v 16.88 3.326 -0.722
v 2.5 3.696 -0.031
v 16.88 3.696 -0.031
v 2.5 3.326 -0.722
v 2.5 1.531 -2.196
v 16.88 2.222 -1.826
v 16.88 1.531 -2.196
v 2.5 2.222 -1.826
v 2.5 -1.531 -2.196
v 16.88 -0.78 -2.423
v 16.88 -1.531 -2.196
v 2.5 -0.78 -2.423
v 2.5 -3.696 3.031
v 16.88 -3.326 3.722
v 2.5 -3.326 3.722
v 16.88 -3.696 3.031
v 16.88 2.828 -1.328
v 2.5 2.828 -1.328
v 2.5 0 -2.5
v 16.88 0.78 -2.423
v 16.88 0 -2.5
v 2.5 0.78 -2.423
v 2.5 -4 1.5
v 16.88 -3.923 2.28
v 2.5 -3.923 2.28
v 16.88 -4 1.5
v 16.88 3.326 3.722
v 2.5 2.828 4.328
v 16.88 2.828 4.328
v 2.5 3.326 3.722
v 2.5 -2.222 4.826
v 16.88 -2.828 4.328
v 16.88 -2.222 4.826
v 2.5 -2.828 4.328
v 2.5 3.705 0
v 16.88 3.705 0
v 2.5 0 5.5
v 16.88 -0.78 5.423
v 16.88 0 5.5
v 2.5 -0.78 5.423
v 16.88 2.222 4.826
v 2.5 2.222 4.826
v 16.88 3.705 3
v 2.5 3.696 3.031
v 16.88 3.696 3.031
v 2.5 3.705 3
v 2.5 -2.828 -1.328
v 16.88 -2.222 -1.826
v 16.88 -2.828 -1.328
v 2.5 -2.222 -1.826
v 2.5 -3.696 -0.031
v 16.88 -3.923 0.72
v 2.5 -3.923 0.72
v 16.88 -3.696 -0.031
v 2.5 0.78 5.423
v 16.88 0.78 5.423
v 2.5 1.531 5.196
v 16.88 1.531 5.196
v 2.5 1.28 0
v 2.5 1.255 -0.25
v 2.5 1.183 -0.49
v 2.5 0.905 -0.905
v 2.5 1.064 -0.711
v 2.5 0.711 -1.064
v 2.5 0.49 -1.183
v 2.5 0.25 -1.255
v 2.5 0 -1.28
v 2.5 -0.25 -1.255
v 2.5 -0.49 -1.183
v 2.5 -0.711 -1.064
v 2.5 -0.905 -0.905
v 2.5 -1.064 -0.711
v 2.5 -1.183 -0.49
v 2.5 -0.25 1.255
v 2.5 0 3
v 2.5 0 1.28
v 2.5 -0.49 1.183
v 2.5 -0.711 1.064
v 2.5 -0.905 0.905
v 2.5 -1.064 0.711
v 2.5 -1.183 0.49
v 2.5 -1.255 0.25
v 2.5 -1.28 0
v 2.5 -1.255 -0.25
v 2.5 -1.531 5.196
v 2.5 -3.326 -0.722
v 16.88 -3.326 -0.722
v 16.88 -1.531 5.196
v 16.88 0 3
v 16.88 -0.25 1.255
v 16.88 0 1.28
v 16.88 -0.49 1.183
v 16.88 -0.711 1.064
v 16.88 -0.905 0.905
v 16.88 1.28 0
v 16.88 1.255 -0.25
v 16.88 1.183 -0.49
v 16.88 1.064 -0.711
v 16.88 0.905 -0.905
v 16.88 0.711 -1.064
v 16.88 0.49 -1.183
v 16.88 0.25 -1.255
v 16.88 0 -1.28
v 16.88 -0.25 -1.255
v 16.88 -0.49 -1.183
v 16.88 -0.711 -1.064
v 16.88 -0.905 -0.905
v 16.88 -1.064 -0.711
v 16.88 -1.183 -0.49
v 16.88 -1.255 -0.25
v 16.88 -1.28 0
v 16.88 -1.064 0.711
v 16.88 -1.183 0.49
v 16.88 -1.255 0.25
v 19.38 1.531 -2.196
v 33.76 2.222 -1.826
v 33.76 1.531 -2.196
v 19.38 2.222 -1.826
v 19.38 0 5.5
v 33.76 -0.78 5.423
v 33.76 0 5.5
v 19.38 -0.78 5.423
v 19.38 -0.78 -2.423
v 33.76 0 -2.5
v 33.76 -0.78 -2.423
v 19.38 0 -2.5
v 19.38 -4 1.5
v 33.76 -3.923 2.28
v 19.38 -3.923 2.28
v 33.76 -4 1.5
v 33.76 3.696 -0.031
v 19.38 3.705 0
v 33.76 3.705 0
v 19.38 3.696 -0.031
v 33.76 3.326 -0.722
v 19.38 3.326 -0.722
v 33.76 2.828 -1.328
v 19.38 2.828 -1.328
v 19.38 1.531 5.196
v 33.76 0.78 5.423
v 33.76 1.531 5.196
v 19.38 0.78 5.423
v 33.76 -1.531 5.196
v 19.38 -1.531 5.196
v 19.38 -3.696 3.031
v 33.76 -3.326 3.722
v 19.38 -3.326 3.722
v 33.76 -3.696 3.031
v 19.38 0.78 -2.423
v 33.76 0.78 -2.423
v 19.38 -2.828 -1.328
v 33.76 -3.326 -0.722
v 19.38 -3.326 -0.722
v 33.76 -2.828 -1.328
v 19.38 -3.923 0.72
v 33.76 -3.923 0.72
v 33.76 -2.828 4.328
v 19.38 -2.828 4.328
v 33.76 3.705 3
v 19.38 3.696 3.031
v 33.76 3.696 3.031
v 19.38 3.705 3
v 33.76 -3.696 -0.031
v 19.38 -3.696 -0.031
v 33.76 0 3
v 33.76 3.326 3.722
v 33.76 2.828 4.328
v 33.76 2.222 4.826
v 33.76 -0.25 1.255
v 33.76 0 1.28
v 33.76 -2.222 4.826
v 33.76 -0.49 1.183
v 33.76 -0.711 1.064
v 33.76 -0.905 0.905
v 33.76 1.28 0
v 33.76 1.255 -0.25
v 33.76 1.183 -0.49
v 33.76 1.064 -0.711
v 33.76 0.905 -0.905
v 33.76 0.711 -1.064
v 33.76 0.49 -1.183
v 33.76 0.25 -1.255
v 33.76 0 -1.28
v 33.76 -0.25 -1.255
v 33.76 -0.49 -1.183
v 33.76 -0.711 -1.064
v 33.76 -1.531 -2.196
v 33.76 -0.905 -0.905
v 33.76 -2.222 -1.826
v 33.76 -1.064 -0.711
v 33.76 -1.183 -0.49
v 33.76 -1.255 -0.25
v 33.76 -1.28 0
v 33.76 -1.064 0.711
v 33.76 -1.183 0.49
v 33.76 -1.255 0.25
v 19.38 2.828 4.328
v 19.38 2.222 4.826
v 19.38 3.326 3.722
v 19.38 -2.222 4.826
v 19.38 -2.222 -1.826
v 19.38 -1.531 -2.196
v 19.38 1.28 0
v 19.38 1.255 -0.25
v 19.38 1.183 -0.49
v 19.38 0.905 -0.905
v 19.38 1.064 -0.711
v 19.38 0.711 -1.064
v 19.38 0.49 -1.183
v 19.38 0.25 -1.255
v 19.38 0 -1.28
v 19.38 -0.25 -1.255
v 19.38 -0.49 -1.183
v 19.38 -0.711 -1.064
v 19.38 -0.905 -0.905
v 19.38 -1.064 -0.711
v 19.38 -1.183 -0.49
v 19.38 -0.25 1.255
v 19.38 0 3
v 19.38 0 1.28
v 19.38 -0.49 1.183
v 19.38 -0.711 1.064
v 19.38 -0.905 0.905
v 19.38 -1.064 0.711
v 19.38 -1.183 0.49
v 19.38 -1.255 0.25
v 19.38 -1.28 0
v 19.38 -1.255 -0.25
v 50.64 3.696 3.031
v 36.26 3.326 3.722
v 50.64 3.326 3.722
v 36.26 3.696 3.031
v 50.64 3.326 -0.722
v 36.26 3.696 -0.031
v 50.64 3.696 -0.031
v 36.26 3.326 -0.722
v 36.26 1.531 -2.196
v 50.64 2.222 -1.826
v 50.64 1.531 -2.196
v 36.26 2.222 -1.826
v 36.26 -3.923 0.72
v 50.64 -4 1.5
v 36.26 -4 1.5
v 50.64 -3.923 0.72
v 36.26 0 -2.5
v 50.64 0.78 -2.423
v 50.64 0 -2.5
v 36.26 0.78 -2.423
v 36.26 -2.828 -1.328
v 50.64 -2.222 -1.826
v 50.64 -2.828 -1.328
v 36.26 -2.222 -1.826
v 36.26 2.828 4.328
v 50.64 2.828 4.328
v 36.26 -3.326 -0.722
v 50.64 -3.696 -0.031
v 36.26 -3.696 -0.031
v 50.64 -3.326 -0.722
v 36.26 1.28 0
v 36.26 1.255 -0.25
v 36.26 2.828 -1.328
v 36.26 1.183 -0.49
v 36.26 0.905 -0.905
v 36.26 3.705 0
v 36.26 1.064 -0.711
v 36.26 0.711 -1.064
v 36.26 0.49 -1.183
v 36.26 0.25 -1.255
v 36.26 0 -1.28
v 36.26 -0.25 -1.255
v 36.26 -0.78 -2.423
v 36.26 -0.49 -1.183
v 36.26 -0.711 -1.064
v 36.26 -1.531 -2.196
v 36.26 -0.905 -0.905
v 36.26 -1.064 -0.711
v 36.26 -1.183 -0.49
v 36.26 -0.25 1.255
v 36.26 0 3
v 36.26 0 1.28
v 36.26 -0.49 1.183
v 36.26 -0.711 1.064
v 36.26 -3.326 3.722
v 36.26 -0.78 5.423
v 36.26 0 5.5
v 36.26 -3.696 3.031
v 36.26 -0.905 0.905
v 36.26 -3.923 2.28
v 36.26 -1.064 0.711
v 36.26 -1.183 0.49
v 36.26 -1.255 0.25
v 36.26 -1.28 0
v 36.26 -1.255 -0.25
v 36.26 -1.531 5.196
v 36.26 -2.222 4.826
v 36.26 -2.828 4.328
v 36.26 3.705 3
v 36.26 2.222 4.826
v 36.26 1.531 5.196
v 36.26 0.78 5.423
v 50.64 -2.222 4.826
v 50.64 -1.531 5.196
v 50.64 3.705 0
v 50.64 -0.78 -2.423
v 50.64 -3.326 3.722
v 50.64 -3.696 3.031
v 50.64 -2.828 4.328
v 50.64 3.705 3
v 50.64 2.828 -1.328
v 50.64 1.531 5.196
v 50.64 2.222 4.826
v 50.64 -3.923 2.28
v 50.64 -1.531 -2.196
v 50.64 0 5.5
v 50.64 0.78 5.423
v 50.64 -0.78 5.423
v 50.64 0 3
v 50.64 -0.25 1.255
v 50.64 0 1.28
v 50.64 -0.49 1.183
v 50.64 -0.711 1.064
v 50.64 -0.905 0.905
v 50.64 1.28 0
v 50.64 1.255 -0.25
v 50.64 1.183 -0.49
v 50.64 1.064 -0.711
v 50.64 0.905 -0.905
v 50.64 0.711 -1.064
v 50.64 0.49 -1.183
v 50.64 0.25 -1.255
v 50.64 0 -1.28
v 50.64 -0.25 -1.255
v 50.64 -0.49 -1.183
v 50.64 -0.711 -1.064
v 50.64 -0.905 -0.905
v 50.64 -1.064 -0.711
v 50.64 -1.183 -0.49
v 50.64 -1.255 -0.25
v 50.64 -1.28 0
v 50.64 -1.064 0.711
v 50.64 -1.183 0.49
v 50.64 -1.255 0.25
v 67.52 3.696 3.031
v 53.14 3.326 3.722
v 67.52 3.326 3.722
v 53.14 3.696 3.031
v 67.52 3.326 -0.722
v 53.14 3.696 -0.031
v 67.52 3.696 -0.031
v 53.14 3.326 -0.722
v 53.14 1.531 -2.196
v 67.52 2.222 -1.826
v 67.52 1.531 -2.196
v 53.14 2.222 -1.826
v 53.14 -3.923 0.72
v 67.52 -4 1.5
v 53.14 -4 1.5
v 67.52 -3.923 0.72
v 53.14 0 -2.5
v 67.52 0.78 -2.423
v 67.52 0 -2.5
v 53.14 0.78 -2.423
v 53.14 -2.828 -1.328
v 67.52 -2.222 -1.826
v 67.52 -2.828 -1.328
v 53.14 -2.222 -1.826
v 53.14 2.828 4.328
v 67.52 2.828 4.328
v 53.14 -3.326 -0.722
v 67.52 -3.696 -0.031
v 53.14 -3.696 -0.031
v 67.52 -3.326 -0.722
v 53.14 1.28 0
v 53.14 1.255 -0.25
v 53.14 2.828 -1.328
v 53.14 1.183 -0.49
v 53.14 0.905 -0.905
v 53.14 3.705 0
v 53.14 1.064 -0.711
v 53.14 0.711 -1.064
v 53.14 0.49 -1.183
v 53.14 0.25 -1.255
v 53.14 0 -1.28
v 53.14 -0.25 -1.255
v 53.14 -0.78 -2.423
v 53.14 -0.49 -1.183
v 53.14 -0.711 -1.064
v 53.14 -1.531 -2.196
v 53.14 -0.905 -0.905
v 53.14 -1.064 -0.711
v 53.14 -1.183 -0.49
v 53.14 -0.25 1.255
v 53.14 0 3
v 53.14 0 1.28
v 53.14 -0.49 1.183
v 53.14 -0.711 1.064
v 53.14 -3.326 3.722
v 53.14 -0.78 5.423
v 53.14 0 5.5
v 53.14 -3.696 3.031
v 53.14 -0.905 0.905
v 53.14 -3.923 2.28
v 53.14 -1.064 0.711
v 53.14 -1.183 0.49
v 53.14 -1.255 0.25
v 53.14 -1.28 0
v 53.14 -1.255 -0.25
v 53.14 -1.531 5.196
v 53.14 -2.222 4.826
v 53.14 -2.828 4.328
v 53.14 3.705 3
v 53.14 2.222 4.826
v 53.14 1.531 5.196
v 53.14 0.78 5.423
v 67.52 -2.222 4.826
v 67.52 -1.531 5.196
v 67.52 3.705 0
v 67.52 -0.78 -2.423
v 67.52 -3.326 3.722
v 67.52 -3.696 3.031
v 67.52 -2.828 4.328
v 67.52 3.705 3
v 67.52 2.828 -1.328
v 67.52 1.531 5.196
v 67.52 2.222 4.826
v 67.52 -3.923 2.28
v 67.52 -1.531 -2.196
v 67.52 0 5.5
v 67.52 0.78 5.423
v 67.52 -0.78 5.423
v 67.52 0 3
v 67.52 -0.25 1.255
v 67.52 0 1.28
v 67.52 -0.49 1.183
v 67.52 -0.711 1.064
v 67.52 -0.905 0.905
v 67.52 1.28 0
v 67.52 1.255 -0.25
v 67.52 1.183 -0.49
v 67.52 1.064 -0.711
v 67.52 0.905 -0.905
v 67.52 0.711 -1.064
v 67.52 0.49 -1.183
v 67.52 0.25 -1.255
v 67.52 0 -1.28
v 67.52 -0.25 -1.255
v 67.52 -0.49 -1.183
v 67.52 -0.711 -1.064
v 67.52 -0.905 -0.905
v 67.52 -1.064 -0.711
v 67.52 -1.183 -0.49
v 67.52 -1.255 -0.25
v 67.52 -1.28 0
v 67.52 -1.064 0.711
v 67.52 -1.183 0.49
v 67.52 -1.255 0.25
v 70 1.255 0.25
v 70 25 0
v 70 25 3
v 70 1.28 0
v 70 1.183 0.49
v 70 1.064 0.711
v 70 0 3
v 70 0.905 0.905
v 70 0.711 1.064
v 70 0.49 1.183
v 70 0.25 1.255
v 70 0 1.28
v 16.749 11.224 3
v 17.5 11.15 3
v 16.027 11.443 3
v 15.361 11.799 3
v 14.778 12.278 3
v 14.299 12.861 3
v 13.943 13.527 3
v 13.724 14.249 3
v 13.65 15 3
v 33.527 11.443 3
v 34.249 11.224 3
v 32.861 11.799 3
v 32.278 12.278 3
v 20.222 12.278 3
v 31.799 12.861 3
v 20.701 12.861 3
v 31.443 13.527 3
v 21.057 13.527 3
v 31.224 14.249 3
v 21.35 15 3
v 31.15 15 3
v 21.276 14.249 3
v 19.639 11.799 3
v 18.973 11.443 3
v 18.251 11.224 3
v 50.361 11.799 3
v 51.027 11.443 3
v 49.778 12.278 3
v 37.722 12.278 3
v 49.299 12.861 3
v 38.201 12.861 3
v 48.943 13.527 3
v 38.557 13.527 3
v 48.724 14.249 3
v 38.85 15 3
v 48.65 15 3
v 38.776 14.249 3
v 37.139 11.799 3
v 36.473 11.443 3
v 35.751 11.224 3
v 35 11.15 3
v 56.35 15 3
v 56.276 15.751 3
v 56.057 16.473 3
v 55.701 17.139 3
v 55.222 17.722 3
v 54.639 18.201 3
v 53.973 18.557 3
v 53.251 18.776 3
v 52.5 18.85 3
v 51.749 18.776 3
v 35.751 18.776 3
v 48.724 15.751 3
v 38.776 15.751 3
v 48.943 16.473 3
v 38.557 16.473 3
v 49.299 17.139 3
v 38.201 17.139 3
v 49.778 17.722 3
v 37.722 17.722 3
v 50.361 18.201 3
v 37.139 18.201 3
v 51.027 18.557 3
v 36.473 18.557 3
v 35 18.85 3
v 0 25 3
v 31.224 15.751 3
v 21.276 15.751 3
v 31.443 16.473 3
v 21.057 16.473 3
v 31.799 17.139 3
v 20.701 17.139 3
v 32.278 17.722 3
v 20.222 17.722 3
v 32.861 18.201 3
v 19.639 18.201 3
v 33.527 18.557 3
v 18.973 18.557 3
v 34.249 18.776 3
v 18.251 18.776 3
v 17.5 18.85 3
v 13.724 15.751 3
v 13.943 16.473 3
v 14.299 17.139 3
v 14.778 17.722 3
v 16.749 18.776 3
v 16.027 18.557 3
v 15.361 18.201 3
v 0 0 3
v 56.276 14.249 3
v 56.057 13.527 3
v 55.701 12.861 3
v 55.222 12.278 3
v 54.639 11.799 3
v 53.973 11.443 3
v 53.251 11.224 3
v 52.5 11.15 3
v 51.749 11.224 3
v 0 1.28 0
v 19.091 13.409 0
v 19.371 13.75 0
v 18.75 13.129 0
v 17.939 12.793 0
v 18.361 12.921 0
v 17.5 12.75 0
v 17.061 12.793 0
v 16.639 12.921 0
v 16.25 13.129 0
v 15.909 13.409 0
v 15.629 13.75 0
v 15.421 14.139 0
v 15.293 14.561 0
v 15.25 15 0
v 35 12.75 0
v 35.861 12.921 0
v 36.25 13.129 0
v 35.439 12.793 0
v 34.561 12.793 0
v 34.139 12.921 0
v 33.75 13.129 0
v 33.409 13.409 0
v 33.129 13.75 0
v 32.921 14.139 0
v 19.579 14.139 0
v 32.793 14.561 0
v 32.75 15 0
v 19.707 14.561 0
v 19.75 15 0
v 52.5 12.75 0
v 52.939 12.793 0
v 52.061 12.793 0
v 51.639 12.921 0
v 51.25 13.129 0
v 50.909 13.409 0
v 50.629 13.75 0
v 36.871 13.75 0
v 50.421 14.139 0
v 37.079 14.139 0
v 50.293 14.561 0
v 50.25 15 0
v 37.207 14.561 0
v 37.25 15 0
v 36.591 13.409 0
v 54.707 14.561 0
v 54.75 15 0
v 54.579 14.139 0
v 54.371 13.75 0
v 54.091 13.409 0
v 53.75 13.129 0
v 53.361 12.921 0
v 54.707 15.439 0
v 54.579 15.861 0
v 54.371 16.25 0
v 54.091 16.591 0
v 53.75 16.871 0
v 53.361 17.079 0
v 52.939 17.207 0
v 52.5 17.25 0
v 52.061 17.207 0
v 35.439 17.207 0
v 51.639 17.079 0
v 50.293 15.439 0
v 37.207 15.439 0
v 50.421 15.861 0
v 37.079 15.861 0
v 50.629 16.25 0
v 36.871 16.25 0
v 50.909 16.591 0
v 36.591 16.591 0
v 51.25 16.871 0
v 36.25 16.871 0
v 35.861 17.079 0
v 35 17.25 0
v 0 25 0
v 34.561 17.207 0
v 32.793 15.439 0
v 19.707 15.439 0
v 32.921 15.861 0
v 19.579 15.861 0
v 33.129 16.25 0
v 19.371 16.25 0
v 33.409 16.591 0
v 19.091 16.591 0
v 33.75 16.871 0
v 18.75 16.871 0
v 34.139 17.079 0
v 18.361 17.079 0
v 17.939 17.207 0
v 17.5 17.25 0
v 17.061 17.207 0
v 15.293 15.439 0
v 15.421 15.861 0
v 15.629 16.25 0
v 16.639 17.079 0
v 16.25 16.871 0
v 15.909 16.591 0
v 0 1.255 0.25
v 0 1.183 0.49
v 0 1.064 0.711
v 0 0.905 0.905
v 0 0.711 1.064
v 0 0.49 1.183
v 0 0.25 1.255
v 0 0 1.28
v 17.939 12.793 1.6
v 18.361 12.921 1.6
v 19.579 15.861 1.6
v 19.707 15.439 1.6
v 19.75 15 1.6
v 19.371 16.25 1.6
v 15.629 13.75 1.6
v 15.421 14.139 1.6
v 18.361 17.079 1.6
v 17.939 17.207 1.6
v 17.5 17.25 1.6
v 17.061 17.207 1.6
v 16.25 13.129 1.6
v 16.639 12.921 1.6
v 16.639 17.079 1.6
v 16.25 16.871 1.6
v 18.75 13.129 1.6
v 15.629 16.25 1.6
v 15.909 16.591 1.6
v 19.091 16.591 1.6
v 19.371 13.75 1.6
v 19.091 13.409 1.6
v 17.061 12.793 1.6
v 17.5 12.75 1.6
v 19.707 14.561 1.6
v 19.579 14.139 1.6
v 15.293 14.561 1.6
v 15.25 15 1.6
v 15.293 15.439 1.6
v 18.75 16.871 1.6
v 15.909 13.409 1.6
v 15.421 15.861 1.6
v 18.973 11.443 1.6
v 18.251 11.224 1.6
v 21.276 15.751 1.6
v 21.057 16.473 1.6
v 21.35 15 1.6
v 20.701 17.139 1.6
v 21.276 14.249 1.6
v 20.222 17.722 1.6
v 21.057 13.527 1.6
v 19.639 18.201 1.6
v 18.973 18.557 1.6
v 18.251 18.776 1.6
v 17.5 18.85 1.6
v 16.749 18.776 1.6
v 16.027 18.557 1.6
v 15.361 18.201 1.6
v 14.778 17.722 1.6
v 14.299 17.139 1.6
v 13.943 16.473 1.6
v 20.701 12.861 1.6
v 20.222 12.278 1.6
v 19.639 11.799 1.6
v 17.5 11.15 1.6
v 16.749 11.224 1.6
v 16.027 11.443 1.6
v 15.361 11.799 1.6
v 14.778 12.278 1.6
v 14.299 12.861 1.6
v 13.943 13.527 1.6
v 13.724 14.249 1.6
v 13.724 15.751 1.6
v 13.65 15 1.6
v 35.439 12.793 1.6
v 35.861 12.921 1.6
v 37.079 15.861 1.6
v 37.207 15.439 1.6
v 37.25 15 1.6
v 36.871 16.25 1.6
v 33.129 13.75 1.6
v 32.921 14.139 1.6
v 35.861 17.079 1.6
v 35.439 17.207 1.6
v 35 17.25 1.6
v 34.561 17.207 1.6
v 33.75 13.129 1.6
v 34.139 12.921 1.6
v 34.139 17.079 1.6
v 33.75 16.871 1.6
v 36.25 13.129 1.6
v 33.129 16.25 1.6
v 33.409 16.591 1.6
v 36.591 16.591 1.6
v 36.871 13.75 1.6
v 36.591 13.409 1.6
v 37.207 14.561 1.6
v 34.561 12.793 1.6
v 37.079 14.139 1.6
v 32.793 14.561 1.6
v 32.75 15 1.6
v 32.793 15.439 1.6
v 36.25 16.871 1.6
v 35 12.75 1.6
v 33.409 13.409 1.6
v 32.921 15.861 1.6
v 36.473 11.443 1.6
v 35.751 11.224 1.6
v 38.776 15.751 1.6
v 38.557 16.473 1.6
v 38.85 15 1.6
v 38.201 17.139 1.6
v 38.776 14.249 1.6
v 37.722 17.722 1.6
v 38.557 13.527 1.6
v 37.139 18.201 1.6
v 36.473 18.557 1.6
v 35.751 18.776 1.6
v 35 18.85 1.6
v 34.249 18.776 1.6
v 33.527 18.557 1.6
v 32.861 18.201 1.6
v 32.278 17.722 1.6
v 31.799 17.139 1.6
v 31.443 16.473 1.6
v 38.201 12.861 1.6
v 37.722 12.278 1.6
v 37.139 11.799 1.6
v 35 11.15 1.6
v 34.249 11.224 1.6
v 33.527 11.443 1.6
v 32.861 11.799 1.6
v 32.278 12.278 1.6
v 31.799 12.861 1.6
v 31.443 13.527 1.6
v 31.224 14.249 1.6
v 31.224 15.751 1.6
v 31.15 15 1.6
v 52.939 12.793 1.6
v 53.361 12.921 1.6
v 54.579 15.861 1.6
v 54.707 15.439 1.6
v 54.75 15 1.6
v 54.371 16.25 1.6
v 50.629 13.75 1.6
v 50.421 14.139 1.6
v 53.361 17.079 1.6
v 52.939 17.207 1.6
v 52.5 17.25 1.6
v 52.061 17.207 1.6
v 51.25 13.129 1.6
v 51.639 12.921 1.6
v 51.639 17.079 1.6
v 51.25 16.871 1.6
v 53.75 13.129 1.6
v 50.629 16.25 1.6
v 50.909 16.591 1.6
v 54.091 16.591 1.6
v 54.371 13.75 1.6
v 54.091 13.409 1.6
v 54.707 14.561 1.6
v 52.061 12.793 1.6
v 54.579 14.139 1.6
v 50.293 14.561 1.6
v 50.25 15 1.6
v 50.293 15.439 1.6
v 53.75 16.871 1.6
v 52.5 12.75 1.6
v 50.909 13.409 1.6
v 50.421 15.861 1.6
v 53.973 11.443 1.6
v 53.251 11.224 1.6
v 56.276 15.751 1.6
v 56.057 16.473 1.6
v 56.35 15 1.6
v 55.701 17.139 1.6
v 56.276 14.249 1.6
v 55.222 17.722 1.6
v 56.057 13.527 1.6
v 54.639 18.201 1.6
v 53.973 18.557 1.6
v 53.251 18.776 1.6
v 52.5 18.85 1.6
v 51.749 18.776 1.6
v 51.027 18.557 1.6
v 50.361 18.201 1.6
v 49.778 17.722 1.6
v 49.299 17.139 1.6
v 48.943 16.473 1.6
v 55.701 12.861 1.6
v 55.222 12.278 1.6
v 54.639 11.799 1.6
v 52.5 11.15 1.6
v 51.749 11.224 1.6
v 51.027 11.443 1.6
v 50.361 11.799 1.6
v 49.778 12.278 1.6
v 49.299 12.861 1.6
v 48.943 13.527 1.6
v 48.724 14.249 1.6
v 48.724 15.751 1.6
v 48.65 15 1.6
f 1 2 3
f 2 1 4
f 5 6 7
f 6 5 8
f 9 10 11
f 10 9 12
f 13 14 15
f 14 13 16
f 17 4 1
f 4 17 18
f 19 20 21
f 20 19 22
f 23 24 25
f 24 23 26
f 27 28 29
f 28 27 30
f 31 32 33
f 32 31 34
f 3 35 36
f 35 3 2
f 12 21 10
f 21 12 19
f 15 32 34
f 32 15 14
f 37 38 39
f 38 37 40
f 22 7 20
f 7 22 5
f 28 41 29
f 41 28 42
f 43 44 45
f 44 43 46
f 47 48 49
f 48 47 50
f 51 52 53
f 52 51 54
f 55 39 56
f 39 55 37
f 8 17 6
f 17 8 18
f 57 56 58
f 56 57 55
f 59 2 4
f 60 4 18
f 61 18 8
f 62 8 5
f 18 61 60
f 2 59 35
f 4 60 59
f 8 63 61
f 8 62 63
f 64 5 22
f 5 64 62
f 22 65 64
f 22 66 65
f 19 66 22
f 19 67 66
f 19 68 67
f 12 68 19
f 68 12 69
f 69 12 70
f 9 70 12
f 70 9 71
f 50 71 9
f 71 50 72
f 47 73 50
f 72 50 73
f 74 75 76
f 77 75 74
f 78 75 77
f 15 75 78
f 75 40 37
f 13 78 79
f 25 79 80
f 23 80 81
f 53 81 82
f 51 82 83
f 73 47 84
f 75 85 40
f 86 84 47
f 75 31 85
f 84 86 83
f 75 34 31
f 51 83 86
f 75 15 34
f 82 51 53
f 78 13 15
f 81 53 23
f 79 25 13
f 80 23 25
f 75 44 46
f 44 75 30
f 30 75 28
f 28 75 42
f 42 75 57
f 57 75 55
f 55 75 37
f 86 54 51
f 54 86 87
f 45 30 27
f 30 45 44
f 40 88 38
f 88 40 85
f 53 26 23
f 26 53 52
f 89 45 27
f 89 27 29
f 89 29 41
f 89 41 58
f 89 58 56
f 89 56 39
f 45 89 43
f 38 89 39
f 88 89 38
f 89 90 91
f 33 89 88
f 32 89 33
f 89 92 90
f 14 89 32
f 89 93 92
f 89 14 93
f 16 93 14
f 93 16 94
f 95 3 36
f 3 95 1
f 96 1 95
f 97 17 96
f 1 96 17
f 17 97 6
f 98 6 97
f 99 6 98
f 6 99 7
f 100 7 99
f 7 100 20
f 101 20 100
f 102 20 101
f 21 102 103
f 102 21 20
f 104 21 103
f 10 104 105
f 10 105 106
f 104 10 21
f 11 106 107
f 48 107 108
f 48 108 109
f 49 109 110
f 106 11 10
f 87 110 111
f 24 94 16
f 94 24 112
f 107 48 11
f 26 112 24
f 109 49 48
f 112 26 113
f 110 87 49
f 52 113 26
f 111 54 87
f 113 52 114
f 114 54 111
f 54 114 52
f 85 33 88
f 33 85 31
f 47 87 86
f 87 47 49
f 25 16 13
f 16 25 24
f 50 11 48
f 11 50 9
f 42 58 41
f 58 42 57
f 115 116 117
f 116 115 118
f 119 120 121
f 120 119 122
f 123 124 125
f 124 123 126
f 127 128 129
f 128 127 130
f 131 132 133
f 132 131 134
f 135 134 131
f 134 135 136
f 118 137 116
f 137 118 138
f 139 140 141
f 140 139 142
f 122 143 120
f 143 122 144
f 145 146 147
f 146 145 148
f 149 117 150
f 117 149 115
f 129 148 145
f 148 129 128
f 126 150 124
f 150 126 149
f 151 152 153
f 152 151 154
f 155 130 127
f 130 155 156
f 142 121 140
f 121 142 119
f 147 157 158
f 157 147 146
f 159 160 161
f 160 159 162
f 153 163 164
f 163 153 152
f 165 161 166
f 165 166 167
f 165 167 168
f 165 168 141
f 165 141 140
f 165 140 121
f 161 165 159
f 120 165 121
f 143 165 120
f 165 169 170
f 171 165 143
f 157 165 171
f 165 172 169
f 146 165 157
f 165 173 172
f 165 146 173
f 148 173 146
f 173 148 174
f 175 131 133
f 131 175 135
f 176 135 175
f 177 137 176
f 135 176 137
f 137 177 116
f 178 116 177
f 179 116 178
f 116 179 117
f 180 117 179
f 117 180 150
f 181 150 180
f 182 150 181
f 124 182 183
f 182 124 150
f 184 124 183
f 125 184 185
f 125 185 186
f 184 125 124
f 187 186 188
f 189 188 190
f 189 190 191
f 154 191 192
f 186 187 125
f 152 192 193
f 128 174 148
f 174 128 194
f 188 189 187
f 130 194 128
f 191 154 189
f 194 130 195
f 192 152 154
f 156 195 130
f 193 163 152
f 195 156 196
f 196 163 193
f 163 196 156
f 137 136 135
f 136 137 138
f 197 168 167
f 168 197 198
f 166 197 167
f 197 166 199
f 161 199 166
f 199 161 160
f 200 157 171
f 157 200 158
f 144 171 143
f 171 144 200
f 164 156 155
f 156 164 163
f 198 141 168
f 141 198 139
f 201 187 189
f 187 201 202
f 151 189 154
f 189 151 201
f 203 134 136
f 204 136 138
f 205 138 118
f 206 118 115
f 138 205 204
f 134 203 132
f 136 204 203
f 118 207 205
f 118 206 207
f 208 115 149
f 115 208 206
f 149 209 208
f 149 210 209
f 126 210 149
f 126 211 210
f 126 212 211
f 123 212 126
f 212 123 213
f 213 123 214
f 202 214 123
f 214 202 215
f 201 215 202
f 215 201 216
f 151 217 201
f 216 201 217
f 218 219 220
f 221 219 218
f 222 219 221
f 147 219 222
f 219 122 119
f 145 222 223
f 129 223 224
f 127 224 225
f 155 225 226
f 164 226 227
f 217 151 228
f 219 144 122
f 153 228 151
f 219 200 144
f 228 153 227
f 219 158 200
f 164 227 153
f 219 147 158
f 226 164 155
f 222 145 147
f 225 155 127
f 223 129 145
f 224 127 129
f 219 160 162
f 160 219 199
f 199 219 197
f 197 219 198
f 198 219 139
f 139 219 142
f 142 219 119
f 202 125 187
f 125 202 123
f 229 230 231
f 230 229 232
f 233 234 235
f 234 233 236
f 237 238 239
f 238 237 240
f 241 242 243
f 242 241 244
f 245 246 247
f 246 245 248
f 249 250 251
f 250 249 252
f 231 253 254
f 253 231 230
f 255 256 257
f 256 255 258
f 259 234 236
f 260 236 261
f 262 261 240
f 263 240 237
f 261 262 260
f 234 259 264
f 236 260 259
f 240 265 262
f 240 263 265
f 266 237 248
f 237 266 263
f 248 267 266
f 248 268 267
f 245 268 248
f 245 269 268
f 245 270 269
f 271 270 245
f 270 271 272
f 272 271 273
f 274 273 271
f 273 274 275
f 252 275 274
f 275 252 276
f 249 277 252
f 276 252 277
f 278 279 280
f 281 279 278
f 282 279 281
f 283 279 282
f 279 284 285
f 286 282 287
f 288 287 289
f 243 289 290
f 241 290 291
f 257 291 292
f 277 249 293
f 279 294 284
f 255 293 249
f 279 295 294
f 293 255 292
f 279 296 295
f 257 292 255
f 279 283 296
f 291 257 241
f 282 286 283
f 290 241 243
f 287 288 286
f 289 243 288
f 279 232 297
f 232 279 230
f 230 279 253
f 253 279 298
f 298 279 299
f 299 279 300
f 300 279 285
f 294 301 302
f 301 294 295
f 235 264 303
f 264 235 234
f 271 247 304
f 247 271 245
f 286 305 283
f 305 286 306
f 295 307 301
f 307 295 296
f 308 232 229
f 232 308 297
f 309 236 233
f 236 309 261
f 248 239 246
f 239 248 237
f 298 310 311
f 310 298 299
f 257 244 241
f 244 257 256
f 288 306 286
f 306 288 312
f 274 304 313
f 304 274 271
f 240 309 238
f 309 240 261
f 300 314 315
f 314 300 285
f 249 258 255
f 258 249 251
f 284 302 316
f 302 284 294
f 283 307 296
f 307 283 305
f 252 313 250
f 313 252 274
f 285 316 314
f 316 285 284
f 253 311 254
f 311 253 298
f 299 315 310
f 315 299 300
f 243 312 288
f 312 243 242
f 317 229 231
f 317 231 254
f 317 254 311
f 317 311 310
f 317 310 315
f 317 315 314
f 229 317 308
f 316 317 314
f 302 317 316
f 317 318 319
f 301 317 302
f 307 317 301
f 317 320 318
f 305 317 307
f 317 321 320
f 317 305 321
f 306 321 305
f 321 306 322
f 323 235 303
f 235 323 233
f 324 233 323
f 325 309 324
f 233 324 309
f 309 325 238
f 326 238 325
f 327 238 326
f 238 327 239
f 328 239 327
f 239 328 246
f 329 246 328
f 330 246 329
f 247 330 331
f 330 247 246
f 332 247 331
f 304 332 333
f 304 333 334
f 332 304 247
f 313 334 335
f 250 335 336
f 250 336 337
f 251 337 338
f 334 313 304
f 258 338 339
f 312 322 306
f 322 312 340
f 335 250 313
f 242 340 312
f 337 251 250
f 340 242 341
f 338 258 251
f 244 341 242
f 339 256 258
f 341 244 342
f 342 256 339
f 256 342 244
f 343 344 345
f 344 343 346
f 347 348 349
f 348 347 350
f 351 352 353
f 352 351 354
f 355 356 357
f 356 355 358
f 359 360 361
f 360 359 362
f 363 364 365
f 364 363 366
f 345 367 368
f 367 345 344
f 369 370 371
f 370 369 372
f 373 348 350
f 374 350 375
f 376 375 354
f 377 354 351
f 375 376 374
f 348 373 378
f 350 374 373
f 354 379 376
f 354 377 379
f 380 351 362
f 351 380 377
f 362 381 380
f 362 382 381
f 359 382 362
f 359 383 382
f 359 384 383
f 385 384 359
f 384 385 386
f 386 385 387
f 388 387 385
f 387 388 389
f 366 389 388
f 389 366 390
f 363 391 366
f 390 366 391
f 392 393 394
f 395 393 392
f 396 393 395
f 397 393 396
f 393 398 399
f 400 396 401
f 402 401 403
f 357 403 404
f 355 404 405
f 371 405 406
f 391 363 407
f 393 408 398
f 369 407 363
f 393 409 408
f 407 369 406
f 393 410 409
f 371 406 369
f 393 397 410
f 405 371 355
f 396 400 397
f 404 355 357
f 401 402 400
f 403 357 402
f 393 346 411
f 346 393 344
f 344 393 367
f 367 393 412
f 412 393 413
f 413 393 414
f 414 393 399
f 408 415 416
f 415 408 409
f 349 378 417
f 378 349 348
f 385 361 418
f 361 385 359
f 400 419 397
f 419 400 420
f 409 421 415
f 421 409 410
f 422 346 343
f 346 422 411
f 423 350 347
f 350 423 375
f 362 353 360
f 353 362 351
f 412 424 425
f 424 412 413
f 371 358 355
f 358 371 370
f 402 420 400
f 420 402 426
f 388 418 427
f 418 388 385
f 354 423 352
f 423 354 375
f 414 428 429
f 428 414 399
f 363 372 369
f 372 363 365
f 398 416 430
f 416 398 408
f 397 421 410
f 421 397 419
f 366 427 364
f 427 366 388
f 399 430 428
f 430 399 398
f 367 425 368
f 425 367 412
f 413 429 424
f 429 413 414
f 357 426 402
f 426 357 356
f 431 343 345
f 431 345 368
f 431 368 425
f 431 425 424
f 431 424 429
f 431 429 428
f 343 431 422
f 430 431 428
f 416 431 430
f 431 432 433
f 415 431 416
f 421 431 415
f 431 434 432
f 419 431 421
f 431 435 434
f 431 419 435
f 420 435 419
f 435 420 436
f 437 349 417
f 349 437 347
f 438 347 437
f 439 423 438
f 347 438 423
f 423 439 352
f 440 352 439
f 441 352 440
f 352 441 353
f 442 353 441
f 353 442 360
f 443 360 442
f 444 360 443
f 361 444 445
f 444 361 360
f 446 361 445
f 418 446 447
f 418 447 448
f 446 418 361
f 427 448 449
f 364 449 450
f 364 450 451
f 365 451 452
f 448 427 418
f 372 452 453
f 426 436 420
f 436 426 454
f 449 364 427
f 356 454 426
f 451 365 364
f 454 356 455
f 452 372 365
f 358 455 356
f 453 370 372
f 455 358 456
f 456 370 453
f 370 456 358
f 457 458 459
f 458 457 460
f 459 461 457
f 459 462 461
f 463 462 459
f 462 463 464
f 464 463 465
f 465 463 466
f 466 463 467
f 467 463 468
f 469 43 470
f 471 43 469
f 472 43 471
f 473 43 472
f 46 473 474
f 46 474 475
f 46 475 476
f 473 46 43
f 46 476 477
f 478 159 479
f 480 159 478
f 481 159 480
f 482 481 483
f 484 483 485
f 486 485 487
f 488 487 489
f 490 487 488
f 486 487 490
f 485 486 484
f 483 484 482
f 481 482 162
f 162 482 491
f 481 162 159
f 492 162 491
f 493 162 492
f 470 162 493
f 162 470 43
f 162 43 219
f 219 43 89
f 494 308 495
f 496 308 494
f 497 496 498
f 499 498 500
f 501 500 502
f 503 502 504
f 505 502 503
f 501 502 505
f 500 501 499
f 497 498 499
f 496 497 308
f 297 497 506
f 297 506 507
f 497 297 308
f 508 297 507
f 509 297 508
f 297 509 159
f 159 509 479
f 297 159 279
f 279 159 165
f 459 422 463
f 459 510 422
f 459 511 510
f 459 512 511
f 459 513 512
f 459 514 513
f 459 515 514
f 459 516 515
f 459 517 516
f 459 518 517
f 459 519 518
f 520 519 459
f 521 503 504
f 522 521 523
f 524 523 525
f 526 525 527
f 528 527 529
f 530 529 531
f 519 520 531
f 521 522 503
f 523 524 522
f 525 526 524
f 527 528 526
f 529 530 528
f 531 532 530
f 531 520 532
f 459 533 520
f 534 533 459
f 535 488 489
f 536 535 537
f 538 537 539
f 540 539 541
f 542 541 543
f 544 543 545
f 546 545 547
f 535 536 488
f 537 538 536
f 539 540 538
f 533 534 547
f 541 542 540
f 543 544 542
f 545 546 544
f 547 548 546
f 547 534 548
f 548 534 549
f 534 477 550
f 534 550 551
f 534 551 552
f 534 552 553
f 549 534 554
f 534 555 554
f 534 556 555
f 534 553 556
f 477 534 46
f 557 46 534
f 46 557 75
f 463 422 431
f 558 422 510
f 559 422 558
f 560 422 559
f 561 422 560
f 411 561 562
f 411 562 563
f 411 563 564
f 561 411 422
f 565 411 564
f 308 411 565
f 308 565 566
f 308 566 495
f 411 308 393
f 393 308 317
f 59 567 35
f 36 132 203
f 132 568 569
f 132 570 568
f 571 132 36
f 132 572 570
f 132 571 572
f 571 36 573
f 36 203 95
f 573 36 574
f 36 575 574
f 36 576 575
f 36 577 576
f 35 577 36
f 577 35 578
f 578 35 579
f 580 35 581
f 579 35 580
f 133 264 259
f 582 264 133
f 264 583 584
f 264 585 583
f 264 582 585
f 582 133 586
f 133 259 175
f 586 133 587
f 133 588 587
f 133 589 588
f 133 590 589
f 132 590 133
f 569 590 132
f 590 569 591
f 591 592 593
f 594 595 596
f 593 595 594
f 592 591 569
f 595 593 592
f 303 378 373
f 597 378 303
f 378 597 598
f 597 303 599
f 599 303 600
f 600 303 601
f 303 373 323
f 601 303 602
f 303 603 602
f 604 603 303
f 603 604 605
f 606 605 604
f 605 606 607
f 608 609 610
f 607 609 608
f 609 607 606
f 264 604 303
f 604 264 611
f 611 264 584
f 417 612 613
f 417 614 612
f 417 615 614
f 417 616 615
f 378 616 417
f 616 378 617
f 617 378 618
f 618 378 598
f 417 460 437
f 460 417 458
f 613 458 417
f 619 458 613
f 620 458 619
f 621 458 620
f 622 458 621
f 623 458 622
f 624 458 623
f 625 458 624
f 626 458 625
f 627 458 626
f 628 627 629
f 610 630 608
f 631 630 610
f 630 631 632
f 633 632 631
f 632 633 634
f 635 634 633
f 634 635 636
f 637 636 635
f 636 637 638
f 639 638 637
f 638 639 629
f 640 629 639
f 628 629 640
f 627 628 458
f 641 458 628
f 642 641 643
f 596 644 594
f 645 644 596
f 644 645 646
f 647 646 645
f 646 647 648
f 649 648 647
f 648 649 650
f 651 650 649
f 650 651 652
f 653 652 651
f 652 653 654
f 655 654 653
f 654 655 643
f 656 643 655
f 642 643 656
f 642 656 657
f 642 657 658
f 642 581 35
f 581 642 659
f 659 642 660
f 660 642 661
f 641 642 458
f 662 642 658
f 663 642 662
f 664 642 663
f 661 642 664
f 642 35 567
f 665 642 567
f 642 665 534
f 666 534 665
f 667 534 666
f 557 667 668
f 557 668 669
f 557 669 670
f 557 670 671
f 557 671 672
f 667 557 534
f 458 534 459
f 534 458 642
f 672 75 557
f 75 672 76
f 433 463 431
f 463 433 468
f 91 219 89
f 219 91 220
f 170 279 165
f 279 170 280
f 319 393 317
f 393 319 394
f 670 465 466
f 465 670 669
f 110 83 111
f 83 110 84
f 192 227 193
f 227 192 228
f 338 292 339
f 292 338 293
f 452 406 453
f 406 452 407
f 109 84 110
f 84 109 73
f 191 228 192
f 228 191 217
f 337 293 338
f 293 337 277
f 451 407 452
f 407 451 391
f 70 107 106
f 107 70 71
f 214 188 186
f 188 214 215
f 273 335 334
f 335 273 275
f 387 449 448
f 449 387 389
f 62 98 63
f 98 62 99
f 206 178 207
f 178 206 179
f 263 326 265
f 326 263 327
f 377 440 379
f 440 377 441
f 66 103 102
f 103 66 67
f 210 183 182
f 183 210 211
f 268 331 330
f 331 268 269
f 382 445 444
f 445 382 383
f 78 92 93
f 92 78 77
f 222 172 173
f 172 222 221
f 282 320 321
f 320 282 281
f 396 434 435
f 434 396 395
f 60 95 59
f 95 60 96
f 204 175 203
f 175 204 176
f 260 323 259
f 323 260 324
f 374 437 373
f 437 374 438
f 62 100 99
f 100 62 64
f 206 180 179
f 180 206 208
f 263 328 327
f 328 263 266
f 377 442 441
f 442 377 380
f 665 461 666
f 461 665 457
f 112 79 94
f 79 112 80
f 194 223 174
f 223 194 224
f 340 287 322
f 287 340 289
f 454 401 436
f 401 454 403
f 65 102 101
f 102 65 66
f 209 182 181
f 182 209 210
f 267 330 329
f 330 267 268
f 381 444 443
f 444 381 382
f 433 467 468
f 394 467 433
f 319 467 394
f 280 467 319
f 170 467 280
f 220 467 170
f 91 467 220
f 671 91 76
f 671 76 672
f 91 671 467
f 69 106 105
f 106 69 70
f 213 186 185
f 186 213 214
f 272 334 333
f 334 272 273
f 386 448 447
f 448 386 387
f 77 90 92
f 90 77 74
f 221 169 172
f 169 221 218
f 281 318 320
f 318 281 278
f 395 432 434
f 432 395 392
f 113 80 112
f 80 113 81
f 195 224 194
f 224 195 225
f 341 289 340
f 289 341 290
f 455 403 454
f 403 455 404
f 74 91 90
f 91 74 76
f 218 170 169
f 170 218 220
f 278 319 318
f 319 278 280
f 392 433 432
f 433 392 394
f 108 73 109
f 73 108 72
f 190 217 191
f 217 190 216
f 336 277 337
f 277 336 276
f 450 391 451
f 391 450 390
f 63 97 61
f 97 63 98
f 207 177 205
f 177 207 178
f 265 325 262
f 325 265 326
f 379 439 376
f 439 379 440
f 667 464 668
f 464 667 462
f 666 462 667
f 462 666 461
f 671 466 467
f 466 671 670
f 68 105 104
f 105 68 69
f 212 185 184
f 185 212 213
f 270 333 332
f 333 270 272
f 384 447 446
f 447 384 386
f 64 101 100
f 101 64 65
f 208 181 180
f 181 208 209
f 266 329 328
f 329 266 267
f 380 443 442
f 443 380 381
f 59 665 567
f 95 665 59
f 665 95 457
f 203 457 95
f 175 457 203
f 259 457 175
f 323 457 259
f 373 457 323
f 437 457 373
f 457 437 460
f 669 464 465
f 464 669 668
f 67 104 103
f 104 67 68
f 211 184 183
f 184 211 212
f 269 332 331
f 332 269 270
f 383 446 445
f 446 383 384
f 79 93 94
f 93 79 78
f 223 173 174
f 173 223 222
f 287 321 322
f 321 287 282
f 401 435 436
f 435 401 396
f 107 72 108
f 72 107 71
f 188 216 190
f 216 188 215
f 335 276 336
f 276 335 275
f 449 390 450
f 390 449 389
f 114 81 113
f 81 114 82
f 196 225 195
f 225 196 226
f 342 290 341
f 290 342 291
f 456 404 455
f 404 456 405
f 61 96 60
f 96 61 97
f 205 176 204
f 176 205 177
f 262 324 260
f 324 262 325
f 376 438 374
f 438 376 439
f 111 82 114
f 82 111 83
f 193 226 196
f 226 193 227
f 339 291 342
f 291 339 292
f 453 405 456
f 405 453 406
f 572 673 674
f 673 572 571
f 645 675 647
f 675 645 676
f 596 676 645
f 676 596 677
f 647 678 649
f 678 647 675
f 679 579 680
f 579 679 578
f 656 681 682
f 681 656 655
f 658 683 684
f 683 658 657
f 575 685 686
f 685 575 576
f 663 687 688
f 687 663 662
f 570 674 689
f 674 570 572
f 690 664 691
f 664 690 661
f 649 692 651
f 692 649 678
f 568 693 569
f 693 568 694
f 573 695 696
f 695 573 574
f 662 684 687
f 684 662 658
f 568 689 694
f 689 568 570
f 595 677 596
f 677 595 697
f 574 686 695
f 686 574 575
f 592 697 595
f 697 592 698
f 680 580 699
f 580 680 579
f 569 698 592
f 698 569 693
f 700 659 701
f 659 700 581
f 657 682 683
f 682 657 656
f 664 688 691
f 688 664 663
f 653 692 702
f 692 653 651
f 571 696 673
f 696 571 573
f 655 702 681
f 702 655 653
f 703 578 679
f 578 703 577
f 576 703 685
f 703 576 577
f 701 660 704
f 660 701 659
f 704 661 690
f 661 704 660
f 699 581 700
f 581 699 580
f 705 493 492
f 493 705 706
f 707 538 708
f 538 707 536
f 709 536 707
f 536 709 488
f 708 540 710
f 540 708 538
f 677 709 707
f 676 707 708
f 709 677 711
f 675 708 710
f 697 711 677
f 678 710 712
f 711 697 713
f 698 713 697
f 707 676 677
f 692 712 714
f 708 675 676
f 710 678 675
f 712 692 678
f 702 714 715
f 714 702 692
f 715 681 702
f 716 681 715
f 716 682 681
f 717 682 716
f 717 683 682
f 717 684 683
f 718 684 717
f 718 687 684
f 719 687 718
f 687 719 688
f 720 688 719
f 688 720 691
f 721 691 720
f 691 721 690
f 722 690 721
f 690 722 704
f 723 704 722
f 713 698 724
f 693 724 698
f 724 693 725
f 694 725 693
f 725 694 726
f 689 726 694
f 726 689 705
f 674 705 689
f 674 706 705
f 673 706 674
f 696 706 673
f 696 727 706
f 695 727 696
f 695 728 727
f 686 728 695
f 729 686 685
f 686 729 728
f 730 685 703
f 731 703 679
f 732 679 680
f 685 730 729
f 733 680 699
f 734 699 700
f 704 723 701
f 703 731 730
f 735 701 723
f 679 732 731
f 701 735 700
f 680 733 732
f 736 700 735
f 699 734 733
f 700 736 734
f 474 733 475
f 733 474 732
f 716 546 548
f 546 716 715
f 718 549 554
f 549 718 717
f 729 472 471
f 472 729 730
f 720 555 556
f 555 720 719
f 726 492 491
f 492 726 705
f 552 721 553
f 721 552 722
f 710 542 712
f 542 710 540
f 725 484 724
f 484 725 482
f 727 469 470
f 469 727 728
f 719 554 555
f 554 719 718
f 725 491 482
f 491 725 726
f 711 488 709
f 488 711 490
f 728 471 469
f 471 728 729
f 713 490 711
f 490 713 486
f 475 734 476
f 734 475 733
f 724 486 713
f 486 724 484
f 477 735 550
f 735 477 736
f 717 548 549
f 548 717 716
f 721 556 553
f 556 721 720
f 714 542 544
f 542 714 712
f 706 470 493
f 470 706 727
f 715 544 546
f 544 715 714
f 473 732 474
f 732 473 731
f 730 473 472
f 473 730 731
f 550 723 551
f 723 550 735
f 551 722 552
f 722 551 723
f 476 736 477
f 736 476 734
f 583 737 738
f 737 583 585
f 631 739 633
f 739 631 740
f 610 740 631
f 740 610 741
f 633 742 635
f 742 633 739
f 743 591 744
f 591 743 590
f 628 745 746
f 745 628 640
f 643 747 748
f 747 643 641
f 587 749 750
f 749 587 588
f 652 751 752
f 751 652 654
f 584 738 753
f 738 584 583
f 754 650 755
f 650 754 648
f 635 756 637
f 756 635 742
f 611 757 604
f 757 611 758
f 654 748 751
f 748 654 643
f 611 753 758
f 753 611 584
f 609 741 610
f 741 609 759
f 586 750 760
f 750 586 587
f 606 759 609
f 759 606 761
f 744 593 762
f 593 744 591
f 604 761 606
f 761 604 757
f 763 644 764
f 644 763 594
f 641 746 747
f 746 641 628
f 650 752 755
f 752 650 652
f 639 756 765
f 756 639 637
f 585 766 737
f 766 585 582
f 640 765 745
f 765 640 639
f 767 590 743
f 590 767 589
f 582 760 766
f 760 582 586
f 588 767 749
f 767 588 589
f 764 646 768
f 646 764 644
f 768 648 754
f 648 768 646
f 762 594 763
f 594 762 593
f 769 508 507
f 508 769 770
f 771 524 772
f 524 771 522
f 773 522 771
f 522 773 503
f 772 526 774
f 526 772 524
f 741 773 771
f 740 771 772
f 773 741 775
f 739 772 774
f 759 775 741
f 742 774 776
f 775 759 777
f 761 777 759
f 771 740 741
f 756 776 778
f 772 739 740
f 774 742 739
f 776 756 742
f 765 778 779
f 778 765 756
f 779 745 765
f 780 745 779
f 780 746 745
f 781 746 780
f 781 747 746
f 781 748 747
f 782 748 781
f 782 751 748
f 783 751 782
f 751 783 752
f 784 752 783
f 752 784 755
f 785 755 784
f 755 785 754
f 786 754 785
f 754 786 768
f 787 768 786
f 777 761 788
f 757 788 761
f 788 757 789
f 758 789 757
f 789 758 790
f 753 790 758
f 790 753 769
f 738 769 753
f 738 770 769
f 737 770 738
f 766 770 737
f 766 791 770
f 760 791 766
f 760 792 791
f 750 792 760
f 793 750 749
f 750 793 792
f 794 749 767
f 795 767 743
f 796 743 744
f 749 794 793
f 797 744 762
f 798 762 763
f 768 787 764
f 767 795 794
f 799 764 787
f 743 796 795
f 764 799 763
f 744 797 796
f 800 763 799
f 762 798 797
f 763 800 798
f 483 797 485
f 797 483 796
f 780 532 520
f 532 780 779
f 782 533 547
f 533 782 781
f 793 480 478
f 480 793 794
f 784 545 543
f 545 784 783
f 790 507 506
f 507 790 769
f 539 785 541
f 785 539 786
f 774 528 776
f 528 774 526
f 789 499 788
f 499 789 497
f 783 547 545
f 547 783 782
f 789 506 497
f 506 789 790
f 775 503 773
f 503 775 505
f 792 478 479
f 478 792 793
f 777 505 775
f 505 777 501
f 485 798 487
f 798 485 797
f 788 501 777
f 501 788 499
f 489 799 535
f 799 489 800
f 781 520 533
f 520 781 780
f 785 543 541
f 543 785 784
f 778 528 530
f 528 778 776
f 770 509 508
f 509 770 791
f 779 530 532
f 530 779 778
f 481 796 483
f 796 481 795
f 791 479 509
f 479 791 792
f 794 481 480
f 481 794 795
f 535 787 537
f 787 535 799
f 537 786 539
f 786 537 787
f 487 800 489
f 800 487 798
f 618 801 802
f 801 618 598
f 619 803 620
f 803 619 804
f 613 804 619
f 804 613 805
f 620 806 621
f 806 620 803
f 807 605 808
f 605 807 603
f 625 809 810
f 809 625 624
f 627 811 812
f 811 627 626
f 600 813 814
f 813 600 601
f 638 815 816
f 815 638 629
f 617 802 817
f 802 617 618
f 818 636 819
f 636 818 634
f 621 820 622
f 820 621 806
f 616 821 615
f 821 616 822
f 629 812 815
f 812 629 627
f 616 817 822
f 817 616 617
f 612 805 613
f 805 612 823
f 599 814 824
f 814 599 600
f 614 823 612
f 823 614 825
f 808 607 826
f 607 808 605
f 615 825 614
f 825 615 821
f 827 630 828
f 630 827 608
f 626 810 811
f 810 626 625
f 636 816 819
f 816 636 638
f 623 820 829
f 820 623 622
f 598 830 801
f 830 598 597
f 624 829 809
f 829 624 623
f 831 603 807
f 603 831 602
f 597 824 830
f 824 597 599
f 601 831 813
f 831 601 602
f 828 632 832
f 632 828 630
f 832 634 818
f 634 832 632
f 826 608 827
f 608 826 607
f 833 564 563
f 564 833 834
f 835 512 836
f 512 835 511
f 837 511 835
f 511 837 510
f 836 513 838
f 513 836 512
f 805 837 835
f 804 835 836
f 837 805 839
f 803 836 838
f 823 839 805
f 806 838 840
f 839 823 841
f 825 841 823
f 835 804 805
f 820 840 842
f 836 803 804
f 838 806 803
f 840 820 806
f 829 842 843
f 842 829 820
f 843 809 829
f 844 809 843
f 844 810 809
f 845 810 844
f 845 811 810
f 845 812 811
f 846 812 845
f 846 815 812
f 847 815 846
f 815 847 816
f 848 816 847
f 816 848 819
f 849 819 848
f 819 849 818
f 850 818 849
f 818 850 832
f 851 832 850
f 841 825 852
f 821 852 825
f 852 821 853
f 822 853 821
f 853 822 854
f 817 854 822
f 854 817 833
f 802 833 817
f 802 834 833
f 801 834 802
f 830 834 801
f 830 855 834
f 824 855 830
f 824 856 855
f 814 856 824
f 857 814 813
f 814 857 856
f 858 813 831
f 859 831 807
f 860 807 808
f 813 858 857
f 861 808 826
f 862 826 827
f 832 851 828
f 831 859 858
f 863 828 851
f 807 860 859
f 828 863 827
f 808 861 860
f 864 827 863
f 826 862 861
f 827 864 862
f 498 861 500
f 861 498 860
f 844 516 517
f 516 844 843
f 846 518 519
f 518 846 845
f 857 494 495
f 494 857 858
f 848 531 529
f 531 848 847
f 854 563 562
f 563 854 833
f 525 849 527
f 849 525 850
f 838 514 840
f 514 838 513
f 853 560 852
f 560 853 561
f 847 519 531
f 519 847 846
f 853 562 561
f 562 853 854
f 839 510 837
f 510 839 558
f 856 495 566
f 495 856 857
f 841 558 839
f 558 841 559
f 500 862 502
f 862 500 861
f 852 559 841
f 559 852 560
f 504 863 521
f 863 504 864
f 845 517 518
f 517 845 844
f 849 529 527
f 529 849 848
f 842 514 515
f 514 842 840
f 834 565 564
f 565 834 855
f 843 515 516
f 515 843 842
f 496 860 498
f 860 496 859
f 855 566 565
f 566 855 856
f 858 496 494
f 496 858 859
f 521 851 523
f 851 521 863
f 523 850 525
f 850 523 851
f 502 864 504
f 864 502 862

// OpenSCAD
$fn = 32;

// ----------------------------------------------------------------------
// Hinge leaf: 70 x 29 x 8 mm
// ----------------------------------------------------------------------

// --- parameters (mm) ---
leaf_len = 70;            // leaf length, X
leaf_w = 25;              // leaf width, Y
leaf_t = 3;               // leaf thickness
knuckle_d = 8;            // knuckle diameter
knuckle_w = 14.38;        // knuckle width
knuckle_n = 4;            // number of knuckles
pin_d = 2.56;             // pin bore
gap = 2.5;                // gap between the knuckles
screw_d = 4.5;            // screw clearance
cs_d = 7.7;               // countersink diameter
cs_h = 1.4;               // countersink depth

module leaf() {
  cube([leaf_len, leaf_w, leaf_t]);
}

module knuckles() {
  /* barrels sit on the leaf edge, the pin axis at half the leaf thickness */
  for (i = [0 : knuckle_n - 1])
    translate([gap + i * (knuckle_w + gap), 0, leaf_t * 0.5])
      rotate([0, 90, 0]) cylinder(h = knuckle_w, d = knuckle_d);
}

difference() {
  union() {
    leaf();
    knuckles();
  }
  rotate([0, 90, 0]) translate([0, 0, -1])
    cylinder(h = leaf_len + 2, d = pin_d);
  translate([17.5, leaf_w * 0.6, -1]) cylinder(h = leaf_t + 2, d = screw_d);
  translate([17.5, leaf_w * 0.6, leaf_t - cs_h]) cylinder(h = cs_h + 0.5, d = cs_d);
  translate([35, leaf_w * 0.6, -1]) cylinder(h = leaf_t + 2, d = screw_d);
  translate([35, leaf_w * 0.6, leaf_t - cs_h]) cylinder(h = cs_h + 0.5, d = cs_d);
  translate([52.5, leaf_w * 0.6, -1]) cylinder(h = leaf_t + 2, d = screw_d);
  translate([52.5, leaf_w * 0.6, leaf_t - cs_h]) cylinder(h = cs_h + 0.5, d = cs_d);
}
